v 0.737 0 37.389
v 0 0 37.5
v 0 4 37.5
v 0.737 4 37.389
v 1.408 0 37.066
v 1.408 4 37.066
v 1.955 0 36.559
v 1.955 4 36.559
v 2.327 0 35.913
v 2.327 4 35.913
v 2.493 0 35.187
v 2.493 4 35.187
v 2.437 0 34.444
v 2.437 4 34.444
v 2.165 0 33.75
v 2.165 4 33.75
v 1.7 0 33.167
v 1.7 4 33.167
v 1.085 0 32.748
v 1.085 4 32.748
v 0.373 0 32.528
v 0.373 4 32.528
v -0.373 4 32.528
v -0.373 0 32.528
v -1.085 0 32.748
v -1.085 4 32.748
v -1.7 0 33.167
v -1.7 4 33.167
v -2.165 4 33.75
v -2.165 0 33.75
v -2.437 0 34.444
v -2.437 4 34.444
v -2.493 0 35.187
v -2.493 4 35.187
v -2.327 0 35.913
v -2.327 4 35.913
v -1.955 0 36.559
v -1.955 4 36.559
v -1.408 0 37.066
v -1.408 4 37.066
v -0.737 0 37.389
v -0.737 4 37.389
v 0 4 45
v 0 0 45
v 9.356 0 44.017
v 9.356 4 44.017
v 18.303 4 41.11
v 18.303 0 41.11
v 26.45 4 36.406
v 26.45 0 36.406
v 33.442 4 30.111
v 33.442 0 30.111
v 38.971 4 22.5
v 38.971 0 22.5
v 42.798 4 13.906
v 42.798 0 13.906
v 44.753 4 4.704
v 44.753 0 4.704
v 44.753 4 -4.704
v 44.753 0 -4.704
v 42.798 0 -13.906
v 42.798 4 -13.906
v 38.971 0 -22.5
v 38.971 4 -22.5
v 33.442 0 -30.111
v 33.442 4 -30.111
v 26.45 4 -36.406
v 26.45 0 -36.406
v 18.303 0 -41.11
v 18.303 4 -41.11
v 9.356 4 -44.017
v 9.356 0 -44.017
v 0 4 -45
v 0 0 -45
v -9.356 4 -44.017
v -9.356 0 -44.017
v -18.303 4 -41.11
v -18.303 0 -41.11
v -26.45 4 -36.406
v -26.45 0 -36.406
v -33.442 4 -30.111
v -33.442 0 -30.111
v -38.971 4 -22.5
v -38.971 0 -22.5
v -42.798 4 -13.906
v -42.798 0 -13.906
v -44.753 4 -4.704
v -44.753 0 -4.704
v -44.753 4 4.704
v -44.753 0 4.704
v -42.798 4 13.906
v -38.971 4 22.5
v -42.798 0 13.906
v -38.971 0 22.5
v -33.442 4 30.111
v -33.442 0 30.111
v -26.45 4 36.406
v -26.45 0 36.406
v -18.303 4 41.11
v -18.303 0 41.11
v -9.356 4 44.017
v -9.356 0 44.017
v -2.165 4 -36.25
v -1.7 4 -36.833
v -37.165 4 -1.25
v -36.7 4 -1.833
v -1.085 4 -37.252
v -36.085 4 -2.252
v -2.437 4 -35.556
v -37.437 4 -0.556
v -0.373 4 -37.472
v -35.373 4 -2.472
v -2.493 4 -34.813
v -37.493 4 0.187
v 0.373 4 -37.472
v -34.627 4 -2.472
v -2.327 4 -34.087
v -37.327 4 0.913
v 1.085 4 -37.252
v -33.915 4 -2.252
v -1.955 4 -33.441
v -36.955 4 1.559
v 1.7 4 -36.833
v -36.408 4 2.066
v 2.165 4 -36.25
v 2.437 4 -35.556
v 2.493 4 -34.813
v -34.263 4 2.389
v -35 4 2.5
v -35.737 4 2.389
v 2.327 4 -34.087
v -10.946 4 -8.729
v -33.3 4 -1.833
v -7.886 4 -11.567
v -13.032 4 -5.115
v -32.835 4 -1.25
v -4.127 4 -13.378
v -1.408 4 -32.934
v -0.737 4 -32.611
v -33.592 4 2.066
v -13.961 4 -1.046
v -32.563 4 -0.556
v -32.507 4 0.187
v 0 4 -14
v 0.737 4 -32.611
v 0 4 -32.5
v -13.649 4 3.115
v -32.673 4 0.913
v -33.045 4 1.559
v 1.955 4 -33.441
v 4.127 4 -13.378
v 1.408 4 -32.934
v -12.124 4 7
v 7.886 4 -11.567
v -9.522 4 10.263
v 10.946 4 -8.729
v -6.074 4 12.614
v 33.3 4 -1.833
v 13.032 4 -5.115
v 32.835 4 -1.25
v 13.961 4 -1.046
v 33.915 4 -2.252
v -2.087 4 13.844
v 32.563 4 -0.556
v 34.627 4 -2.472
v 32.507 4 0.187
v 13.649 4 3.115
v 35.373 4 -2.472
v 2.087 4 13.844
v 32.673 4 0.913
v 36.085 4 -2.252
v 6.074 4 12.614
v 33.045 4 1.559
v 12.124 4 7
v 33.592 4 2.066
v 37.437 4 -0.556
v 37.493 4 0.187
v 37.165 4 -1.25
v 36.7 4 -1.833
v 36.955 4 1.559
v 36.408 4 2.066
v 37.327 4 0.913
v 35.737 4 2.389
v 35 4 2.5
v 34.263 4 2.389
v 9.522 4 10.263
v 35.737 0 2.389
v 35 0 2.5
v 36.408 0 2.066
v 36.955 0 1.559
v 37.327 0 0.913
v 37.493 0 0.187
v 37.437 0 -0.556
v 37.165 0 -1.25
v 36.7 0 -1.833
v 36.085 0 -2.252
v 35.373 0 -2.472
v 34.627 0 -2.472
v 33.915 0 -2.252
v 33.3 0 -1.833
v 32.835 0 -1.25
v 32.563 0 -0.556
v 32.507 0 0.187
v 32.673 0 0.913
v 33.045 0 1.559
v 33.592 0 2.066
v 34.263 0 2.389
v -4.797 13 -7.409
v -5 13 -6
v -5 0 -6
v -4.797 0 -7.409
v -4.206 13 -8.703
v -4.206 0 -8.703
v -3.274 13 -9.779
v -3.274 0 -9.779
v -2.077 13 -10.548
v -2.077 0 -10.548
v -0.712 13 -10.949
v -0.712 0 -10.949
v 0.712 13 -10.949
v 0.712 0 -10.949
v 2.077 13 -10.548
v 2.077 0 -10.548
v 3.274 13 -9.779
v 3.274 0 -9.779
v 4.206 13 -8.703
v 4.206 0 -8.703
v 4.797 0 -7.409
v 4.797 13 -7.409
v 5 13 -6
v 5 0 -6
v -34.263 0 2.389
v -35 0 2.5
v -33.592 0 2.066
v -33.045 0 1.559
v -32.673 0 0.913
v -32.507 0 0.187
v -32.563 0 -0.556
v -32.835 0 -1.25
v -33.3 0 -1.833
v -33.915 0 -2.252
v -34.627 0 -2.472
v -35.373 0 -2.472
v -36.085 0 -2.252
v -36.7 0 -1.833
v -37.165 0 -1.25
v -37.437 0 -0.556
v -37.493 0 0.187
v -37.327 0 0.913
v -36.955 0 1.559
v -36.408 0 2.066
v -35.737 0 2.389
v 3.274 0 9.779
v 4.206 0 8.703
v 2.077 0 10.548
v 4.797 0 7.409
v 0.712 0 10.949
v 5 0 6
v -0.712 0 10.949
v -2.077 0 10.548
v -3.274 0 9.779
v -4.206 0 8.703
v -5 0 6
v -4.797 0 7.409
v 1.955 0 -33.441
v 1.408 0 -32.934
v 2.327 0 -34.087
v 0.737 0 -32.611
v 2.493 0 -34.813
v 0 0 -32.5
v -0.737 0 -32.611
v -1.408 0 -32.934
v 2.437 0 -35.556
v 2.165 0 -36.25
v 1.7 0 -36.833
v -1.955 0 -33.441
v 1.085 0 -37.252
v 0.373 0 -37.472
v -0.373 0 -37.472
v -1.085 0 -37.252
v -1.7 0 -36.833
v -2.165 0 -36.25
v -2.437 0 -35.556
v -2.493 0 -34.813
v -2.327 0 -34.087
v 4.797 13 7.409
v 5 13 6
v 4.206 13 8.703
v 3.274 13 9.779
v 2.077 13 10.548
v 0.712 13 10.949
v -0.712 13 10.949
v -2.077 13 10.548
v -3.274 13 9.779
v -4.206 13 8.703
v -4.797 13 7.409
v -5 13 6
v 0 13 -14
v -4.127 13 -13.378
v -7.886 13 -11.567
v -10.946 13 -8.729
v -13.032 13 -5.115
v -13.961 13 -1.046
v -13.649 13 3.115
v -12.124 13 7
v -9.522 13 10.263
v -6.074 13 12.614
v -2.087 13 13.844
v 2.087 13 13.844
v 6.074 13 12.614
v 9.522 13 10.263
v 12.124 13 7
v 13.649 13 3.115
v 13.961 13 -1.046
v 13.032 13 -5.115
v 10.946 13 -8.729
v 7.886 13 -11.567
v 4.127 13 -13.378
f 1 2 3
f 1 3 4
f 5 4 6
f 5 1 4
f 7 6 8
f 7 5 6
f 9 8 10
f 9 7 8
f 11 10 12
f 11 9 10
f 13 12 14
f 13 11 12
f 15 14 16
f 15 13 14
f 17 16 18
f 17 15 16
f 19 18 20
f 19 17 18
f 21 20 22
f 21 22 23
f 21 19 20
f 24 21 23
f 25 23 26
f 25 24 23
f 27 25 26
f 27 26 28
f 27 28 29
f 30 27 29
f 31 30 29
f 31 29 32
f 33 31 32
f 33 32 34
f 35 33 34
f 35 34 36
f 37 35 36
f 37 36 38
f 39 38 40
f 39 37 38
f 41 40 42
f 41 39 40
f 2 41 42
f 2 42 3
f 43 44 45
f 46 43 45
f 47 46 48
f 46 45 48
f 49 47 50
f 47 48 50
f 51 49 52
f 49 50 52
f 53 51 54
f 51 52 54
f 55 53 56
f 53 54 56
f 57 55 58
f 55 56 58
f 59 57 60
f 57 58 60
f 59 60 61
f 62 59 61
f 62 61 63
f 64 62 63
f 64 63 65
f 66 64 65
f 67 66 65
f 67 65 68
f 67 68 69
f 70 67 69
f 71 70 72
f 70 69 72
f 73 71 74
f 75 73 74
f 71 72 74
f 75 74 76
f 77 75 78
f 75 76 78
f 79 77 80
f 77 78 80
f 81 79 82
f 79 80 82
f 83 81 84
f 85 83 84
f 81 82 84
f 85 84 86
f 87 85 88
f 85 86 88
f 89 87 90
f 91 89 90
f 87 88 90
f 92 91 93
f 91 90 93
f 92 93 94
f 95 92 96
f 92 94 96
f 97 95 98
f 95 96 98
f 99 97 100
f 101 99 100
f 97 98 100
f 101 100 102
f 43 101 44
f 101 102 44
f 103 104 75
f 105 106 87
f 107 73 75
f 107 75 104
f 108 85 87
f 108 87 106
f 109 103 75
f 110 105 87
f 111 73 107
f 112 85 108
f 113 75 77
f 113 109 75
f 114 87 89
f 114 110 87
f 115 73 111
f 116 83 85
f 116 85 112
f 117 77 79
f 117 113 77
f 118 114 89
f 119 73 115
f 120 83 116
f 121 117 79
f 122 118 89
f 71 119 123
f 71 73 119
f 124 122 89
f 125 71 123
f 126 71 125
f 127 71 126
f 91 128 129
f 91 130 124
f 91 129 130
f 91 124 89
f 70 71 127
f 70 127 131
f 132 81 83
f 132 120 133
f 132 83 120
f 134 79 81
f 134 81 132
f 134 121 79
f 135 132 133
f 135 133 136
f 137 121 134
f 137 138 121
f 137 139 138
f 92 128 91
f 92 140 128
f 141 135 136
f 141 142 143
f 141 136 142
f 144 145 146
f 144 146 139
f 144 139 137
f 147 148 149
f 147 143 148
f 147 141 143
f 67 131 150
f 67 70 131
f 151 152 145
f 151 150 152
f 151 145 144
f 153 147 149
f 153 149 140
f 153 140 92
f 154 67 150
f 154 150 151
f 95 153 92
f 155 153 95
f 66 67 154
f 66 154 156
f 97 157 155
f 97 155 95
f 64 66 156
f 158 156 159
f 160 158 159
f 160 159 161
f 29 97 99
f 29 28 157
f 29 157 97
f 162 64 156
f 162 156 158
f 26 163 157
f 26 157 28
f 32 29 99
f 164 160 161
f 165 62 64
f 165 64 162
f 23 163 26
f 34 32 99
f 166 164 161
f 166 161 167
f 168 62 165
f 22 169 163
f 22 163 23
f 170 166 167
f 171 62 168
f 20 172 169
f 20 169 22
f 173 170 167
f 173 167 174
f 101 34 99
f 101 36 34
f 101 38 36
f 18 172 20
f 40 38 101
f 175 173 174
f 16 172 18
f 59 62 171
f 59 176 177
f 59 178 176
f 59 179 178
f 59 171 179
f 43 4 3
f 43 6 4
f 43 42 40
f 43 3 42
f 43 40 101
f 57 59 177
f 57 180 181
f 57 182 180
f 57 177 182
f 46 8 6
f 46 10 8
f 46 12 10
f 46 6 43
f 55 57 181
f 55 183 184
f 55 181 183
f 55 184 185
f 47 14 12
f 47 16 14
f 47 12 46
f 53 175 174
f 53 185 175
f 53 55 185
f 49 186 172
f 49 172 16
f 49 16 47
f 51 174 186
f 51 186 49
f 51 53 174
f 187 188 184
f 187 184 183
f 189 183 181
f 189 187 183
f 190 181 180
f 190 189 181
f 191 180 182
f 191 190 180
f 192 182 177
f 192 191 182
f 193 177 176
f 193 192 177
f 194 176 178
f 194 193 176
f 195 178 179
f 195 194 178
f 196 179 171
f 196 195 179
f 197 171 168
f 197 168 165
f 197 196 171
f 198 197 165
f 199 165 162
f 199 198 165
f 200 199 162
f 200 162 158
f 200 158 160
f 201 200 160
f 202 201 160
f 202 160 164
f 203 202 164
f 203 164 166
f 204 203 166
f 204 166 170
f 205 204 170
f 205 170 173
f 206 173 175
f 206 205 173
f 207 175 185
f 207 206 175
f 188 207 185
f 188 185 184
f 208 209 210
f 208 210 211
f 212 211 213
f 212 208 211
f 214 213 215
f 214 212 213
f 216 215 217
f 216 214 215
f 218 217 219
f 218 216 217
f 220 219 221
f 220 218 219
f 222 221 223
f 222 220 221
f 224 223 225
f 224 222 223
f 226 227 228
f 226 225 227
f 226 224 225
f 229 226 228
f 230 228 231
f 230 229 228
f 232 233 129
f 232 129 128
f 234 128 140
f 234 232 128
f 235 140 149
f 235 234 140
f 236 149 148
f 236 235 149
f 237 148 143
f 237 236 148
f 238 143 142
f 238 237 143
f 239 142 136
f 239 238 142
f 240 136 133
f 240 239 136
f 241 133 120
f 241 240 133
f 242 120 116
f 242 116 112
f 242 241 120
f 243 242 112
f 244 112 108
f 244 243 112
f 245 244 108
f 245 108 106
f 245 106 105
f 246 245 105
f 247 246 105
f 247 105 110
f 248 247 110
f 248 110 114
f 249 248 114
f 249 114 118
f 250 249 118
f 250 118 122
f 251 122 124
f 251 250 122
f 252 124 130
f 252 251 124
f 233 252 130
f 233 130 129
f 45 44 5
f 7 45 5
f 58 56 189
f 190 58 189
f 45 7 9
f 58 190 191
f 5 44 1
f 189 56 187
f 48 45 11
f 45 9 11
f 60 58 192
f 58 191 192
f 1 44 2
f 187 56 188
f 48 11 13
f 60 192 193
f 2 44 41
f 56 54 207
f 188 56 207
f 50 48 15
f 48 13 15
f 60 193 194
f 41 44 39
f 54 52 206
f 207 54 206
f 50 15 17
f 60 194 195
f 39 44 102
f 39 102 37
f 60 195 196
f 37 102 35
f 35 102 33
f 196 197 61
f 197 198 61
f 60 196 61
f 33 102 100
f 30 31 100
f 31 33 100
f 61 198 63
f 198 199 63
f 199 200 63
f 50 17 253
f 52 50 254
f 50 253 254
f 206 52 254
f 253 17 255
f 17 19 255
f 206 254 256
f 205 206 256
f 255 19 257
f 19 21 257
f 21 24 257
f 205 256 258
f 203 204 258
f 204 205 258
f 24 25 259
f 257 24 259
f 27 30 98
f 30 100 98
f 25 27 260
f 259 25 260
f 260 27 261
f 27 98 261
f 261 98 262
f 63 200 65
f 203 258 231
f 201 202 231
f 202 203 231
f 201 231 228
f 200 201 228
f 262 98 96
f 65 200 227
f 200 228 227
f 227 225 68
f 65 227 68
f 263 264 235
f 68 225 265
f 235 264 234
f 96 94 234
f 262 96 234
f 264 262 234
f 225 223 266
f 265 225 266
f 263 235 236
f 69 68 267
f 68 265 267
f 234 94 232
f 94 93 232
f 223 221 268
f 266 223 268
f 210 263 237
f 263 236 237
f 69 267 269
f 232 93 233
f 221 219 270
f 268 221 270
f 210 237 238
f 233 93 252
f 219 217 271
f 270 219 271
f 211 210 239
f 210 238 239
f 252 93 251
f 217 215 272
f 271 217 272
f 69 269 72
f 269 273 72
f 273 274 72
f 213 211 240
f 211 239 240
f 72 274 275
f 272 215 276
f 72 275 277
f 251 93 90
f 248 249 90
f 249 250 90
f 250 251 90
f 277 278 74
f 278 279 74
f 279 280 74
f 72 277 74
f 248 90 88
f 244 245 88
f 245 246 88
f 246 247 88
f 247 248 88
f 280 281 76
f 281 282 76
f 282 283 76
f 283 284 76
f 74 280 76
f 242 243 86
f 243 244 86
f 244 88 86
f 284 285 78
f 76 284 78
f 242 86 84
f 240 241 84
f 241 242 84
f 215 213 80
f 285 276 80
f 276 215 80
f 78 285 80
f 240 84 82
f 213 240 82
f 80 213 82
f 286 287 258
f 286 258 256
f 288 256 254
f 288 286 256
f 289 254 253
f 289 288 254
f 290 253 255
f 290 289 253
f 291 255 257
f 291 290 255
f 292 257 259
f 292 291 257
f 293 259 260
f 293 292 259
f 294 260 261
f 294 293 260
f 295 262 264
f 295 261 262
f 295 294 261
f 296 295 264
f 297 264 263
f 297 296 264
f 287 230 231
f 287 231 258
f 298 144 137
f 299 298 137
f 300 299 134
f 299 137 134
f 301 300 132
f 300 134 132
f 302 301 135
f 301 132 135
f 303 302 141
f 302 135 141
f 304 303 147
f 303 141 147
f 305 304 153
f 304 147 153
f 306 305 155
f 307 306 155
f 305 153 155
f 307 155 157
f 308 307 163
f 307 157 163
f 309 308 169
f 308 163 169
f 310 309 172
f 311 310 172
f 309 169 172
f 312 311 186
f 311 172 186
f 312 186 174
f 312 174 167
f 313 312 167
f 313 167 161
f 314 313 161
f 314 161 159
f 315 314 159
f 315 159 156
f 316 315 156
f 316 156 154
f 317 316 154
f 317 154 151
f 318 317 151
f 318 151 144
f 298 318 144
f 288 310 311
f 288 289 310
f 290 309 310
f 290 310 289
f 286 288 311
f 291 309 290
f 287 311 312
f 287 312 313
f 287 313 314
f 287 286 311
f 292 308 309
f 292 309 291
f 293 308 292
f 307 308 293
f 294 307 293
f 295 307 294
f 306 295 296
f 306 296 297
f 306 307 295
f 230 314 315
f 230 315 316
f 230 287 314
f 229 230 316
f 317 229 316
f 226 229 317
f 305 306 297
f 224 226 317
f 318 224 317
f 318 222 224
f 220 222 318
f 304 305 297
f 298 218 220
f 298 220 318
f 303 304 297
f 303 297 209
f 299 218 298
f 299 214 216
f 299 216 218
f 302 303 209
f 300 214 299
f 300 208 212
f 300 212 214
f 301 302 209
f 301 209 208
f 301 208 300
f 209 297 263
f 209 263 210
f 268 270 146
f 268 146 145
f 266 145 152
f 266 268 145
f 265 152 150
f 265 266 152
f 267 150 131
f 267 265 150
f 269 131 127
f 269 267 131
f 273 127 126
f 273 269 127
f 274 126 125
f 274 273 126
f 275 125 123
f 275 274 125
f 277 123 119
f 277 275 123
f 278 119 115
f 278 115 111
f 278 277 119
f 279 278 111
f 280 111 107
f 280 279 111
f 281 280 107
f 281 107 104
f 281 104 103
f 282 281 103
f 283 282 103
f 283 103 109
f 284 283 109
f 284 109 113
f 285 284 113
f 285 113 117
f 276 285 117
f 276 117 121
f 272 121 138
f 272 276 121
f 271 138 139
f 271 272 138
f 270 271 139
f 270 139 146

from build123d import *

# Parameters (mm, degrees)
SKETCH1_R           = 45
SKETCH1_R_2         = 2.5
BOSS_EXTRUDE1_DEPTH = 4
SKETCH1_3_R         = 14
BOSS_EXTRUDE2_DEPTH = 13
CUT_EXTRUDE1_DEPTH  = 65.953829756


with BuildPart() as part:
    # Sketch1 → Boss-Extrude1 (new body)
    with BuildSketch(Plane(origin=(0, 0, 0), x_dir=(1, 0, 0), z_dir=(0, 1, 0))):
        Circle(SKETCH1_R)
        with Locations((-35, 0)):
            Circle(SKETCH1_R_2, mode=Mode.SUBTRACT)
        with Locations((0, -35)):
            Circle(SKETCH1_R_2, mode=Mode.SUBTRACT)
        with Locations((35, 0)):
            Circle(SKETCH1_R_2, mode=Mode.SUBTRACT)
        with Locations((0, 35)):
            Circle(SKETCH1_R_2, mode=Mode.SUBTRACT)
    extrude(amount=BOSS_EXTRUDE1_DEPTH)

    # Sketch1<3> → Boss-Extrude2 (add)
    with BuildSketch(Plane(origin=(0, 0, 0), x_dir=(1, 0, 0), z_dir=(0, 1, 0))):
        Circle(SKETCH1_3_R)
    extrude(amount=BOSS_EXTRUDE2_DEPTH)

    # Sketch3 → Cut-Extrude1 (cut, through all)
    with BuildSketch(Plane(origin=(0, 13, 0), x_dir=(1, 0, 0), z_dir=(0, 1, 0))):
        with BuildLine():
            Line((-5, -6), (-5, 6))
            ThreePointArc((-5, 6), (0, 11), (5, 6))
            Line((5, 6), (5, -6))
            ThreePointArc((5, -6), (0, -11), (-5, -6))
        make_face()
    extrude(amount=-CUT_EXTRUDE1_DEPTH, mode=Mode.SUBTRACT)


solid = part.part
